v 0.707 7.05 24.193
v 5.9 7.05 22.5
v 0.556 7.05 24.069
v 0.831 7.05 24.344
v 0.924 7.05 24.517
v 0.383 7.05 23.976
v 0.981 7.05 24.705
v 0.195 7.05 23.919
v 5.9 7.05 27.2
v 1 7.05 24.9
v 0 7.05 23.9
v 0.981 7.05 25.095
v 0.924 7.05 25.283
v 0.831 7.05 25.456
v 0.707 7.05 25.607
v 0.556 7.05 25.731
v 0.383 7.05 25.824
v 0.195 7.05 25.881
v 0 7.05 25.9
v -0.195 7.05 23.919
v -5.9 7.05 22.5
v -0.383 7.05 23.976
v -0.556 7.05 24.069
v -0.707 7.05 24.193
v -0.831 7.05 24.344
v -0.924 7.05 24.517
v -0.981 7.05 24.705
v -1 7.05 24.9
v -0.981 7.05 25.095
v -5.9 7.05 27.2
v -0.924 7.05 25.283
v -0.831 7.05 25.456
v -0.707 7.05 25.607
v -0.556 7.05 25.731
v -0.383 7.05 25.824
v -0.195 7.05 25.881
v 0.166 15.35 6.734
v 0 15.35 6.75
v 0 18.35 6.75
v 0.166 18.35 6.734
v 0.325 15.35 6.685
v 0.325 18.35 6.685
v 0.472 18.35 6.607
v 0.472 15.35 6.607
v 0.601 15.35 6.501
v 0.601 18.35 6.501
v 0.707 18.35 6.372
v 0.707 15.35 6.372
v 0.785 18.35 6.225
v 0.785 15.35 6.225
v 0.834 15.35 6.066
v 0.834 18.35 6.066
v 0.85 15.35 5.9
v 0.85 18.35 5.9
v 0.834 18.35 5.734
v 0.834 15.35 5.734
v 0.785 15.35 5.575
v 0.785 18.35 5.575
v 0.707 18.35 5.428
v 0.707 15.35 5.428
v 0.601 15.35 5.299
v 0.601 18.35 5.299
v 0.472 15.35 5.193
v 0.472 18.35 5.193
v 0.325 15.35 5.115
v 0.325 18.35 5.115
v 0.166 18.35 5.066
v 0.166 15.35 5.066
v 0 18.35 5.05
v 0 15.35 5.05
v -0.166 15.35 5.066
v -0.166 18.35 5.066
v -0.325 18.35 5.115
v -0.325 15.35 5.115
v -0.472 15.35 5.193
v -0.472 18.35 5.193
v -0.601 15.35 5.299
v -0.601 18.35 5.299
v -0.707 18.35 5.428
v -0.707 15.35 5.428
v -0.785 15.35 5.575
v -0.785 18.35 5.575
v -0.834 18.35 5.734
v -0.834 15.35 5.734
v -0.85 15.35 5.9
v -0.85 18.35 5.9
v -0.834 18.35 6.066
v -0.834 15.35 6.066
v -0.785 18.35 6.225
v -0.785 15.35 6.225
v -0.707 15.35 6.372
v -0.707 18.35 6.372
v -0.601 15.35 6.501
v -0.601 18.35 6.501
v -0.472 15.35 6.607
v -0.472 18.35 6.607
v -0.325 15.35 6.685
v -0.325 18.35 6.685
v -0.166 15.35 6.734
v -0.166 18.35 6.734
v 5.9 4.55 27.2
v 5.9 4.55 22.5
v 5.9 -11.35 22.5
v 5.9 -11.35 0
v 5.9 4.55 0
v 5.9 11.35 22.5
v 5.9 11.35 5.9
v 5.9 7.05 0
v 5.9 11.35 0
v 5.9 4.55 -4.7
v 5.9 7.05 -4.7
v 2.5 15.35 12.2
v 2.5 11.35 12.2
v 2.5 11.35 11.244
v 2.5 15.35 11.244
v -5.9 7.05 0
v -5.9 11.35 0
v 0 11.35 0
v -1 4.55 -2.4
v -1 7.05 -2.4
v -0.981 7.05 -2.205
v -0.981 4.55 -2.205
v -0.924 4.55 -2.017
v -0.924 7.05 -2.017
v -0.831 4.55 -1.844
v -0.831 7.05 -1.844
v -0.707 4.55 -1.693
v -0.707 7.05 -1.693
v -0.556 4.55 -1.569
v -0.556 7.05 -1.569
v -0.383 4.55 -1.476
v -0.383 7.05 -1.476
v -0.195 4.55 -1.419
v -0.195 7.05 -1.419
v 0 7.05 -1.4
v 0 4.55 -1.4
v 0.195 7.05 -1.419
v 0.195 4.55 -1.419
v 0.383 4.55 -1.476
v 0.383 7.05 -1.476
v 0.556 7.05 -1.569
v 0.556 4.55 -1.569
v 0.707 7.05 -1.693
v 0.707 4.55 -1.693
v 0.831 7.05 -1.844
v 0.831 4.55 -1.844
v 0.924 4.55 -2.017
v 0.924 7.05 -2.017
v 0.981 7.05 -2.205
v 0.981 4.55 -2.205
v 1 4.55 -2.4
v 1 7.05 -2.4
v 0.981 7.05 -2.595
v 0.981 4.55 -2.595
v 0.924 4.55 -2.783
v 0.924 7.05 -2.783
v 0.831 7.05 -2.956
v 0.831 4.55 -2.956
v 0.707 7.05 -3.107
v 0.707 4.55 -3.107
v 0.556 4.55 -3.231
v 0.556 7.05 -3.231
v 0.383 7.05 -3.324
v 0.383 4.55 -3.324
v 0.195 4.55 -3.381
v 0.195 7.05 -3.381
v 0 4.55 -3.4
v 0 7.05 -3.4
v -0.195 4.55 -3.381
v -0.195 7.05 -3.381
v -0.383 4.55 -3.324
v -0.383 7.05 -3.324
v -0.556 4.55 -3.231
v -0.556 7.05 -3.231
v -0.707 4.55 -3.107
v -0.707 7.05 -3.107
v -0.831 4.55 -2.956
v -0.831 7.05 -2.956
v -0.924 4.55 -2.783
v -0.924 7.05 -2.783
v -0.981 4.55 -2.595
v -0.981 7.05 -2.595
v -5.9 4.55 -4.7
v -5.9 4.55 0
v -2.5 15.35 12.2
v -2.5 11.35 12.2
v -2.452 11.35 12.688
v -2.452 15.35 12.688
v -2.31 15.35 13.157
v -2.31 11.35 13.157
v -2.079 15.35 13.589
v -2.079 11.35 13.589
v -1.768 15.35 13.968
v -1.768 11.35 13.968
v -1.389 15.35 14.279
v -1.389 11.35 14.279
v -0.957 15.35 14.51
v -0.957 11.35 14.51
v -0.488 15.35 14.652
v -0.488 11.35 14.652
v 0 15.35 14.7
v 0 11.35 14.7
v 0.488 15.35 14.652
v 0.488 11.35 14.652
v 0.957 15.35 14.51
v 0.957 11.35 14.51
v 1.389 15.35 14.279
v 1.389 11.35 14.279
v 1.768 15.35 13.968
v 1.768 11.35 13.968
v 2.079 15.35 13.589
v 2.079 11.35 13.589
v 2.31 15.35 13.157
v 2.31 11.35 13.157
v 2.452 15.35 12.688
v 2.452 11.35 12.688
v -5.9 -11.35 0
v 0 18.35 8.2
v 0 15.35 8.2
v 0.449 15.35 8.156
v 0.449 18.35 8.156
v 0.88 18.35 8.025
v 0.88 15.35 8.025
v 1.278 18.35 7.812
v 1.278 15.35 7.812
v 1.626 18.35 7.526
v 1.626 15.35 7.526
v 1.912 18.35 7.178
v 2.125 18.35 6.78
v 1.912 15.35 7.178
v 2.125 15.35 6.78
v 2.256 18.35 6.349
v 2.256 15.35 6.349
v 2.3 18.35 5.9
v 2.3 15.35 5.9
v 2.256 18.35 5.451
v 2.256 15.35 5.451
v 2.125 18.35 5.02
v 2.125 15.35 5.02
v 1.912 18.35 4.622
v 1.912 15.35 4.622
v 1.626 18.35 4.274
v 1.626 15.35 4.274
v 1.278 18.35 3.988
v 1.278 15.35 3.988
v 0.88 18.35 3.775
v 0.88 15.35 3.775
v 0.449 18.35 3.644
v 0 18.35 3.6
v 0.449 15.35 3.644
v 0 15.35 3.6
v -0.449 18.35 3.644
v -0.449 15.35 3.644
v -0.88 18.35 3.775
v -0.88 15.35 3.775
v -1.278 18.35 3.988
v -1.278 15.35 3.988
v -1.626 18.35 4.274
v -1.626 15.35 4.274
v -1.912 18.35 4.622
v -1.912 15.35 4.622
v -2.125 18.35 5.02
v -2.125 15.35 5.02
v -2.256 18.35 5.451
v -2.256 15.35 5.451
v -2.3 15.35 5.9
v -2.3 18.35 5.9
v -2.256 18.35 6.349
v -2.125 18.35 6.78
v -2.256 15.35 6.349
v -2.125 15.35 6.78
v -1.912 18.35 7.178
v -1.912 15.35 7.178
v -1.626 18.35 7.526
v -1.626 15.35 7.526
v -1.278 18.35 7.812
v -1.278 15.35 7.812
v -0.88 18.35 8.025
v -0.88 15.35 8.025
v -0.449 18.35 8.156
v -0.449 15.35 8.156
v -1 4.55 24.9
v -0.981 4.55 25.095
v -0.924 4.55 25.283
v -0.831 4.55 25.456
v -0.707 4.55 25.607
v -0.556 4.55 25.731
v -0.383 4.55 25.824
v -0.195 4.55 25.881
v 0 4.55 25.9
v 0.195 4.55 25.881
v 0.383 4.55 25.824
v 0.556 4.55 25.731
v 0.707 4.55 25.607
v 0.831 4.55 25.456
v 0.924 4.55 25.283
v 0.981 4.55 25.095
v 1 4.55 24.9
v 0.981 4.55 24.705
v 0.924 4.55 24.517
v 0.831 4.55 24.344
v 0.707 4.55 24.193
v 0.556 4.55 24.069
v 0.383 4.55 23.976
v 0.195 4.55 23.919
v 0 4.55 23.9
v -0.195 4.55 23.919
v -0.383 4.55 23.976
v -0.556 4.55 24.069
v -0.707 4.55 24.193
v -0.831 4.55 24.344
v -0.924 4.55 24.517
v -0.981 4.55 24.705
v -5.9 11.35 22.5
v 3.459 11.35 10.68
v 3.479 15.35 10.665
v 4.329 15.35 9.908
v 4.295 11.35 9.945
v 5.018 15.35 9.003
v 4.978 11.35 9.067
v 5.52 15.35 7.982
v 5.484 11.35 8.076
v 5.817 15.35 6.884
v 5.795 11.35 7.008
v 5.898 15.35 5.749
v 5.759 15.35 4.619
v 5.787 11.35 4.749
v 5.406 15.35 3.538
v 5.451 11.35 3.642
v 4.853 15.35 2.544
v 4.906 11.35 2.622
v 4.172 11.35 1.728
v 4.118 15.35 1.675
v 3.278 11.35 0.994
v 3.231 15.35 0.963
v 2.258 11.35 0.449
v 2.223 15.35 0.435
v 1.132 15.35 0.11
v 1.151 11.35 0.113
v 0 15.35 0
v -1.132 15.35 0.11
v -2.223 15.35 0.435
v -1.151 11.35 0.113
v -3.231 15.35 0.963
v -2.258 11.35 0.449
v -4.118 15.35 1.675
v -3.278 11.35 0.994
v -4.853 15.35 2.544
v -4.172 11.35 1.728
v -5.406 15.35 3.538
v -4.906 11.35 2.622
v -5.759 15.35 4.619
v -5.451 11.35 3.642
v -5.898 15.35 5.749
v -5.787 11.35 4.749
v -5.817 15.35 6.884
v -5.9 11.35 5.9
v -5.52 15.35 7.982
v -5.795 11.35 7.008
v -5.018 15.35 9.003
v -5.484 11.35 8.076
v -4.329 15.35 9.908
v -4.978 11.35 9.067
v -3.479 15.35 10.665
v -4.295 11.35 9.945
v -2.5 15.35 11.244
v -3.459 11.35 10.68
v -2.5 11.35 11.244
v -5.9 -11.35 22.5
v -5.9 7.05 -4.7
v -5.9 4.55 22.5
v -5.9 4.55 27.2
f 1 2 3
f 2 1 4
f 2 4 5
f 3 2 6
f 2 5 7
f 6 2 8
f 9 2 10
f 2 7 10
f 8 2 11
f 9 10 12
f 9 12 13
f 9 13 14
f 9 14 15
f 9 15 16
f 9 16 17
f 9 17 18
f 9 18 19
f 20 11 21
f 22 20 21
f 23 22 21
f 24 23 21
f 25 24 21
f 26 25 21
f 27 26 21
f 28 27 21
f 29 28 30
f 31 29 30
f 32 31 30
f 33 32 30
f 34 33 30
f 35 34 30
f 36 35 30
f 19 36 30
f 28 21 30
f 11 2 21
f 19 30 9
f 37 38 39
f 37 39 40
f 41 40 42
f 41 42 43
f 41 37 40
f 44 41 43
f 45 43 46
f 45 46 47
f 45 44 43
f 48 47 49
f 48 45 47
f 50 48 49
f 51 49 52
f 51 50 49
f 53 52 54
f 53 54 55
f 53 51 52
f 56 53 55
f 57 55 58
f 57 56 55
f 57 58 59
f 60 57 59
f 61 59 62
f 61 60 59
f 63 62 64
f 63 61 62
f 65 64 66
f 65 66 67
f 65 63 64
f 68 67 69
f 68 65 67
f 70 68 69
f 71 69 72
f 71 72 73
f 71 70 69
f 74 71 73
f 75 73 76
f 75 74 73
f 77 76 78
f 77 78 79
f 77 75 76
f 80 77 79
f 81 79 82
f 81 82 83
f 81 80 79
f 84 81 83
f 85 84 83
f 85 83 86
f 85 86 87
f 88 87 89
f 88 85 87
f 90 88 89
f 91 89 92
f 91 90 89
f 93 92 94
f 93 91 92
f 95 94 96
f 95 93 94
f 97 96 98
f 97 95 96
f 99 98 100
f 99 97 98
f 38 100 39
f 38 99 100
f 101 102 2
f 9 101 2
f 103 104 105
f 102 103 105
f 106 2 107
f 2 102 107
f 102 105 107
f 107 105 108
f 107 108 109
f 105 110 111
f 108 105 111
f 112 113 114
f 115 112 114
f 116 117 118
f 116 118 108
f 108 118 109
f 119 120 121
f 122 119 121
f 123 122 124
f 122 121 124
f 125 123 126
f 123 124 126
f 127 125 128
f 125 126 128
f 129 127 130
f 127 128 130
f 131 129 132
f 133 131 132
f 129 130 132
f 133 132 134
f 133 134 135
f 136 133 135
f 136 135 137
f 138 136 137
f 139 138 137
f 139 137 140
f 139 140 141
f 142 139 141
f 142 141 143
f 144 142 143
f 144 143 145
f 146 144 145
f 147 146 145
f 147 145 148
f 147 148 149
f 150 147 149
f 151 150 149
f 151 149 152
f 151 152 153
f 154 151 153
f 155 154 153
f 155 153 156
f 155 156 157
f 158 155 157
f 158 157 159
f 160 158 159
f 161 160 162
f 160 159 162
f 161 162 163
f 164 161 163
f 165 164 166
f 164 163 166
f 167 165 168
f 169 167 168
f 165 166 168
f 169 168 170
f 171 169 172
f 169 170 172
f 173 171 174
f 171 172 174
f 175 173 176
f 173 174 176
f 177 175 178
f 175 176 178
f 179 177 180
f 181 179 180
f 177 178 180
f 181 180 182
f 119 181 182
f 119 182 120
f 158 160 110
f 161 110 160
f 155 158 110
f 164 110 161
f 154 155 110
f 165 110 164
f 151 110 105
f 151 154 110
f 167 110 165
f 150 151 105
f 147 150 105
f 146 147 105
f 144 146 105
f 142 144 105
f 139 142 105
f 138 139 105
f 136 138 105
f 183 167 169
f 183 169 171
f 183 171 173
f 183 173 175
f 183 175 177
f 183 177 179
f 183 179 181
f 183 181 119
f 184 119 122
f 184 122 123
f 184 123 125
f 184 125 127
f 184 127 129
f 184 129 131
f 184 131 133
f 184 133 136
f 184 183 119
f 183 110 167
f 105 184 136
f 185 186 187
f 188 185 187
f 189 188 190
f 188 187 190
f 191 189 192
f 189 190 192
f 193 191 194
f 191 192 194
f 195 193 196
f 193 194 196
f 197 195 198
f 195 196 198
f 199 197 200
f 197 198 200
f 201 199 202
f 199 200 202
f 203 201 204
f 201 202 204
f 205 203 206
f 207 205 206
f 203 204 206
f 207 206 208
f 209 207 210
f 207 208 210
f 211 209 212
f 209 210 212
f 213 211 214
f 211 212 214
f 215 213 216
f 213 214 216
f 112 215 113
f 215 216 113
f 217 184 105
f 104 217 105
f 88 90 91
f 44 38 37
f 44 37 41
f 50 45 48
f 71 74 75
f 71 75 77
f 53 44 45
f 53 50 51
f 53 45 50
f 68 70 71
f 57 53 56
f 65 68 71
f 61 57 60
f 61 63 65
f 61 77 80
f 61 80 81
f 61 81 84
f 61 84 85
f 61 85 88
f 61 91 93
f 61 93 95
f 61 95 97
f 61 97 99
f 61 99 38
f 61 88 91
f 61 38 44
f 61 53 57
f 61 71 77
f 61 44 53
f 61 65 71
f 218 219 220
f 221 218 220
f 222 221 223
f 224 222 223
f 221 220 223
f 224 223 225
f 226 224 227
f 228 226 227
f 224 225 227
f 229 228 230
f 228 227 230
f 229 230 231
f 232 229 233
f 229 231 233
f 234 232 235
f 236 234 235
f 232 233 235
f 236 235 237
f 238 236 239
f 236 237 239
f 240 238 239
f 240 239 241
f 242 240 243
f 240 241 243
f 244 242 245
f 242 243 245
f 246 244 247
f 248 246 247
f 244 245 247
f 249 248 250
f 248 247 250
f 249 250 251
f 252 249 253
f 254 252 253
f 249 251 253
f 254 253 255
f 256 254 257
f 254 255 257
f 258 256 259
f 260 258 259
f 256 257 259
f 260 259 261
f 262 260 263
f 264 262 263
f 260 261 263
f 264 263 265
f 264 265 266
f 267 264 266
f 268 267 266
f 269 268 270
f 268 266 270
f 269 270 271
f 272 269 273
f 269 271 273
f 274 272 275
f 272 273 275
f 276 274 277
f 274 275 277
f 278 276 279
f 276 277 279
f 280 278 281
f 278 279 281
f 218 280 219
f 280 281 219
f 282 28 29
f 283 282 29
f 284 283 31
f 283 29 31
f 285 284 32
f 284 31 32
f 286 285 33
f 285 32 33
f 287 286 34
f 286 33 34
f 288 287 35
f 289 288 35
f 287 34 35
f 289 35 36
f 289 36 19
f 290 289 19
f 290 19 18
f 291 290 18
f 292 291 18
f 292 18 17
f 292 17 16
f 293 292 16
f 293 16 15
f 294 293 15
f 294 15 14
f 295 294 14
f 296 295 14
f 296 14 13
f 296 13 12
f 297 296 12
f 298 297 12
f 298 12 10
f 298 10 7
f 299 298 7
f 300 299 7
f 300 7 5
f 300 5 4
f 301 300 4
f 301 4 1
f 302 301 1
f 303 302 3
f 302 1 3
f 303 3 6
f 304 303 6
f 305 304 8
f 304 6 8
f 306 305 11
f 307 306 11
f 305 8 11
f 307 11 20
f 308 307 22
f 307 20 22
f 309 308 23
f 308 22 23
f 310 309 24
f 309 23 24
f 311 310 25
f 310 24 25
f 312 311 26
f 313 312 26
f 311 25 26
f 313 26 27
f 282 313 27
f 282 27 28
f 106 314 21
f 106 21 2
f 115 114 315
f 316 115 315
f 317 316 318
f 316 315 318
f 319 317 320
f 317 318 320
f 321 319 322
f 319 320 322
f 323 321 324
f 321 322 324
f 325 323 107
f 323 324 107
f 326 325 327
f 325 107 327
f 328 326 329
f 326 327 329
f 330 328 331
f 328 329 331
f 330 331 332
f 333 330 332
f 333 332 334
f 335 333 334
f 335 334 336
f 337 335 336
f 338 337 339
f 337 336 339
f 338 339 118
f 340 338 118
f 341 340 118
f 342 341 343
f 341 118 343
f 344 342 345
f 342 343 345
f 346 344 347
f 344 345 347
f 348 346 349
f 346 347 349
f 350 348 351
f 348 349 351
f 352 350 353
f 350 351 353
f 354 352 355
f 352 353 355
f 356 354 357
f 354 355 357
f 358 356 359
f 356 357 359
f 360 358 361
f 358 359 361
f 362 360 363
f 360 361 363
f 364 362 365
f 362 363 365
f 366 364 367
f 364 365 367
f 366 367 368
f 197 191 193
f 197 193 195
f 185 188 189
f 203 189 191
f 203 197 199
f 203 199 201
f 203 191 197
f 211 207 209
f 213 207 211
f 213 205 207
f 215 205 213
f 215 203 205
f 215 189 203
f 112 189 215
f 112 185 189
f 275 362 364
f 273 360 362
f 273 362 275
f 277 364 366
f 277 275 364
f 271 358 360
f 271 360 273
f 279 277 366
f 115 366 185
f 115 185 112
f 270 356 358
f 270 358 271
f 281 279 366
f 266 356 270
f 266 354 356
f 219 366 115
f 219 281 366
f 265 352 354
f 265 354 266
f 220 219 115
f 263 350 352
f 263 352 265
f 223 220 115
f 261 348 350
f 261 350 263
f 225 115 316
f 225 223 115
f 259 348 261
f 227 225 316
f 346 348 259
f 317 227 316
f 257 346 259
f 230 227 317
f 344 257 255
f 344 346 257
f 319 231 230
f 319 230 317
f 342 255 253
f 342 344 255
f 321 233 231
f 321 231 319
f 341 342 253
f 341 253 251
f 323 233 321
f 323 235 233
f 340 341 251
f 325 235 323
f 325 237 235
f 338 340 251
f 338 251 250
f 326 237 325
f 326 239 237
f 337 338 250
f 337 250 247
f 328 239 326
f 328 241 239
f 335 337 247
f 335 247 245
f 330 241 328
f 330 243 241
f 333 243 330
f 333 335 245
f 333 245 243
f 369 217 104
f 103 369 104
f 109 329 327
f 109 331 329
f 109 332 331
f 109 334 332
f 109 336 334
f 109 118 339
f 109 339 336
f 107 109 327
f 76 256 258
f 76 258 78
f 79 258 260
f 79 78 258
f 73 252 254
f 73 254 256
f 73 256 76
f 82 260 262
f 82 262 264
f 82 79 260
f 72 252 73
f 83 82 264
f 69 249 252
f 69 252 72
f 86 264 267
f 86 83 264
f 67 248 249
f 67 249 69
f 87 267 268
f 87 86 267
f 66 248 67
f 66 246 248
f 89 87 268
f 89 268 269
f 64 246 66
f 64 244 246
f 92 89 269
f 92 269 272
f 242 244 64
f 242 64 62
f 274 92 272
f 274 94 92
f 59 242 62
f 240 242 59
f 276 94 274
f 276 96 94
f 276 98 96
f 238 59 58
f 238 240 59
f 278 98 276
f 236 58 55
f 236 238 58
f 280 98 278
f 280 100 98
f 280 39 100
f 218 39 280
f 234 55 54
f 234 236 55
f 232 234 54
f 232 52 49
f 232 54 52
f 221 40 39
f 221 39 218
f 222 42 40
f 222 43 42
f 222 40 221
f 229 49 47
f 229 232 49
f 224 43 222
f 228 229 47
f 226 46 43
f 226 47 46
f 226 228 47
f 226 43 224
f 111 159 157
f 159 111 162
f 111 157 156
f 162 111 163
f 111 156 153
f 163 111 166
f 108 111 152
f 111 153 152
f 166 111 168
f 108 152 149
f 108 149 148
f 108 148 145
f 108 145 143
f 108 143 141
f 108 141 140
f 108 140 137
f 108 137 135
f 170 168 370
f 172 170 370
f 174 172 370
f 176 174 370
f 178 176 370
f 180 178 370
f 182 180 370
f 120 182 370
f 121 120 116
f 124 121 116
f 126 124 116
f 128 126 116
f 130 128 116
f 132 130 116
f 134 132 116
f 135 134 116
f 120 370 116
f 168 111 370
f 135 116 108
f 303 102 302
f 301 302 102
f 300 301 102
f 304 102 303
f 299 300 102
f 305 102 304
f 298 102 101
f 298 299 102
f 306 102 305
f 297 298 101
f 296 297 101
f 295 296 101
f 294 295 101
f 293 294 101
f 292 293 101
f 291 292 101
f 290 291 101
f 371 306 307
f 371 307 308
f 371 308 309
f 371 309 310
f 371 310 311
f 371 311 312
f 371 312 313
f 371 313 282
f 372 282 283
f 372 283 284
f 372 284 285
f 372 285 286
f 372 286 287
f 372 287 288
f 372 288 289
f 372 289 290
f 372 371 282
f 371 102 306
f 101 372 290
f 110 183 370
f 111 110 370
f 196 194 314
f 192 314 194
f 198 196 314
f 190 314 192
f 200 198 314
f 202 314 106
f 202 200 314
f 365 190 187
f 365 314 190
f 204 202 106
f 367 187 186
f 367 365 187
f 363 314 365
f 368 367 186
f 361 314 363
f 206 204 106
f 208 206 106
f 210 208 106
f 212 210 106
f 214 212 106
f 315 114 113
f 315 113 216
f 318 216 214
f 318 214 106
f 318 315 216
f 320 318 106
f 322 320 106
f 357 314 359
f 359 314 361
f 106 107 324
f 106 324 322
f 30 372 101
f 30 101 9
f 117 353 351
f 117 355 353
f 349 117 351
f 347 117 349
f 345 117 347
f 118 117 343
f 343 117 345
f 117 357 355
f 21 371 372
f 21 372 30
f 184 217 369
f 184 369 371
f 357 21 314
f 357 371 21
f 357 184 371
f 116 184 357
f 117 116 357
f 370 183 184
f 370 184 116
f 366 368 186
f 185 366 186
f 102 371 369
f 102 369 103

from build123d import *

# Parameters (mm, degrees)
SKETCH1_W           = 11.8
SKETCH1_H           = 22.7
BOSS_EXTRUDE1_DEPTH = 22.5
BOSS_EXTRUDE2_DEPTH = 4
SKETCH3_R           = 2.3
SKETCH3_R_2         = 0.85
BOSS_EXTRUDE3_DEPTH = 3
SKETCH4_W           = 4.7
SKETCH4_H           = 2.5
BOSS_EXTRUDE4_DEPTH = 11.8
CUT_EXTRUDE1_REACH  = 35.365
SKETCH5_R           = 1


with BuildPart() as part:
    # Sketch1 → Boss-Extrude1 (new body)
    with BuildSketch(Plane.XY):
        Rectangle(SKETCH1_W, SKETCH1_H)
    extrude(amount=BOSS_EXTRUDE1_DEPTH)

    # Sketch2 → Boss-Extrude2 (add)
    with BuildSketch(Plane(origin=(0, 11.35, 0), x_dir=(1, 0, 0), z_dir=(0, 1, 0))):
        with BuildLine():
            Line((2.5, -12.2), (2.5, -11.244155686))
            ThreePointArc((2.5, -11.244155686), (0, 0), (-2.5, -11.244155686))
            Line((-2.5, -11.244155686), (-2.5, -12.2))
            ThreePointArc((-2.5, -12.2), (0, -14.7), (2.5, -12.2))
        make_face()
    extrude(amount=BOSS_EXTRUDE2_DEPTH)

    # Sketch3 → Boss-Extrude3 (add)
    with BuildSketch(Plane(origin=(0, 15.35, 0), x_dir=(1, 0, 0), z_dir=(0, 1, 0))):
        with Locations(Location((0, -5.9, 0), (0, 0, 270))):
            Circle(SKETCH3_R)
        with Locations(Location((0, -5.9, 0), (0, 0, 270))):
            Circle(SKETCH3_R_2, mode=Mode.SUBTRACT)
    extrude(amount=BOSS_EXTRUDE3_DEPTH)

    # Sketch4 → Boss-Extrude4 (add)
    with BuildSketch(Plane.ZY.offset(5.9)):
        with Locations((-2.35, 5.8)):
            Rectangle(SKETCH4_W, SKETCH4_H)
        with Locations((24.85, 5.8)):
            Rectangle(SKETCH4_W, SKETCH4_H)
    extrude(amount=-BOSS_EXTRUDE4_DEPTH)

    # Sketch5 → Cut-Extrude1 (cut, up to next)
    with BuildSketch(Plane(origin=(0, 7.05, 0), x_dir=(1, 0, 0), z_dir=(0, 1, 0)), mode=Mode.PRIVATE) as cut_extrude1_sk1:
        with Locations(Location((0, 2.4, 0), (0, 0, 180))):
            Circle(SKETCH5_R)
    cut_extrude1_tool1 = extrude(cut_extrude1_sk1.sketch, amount=-CUT_EXTRUDE1_REACH, mode=Mode.PRIVATE) & part.part
    # Sketch5 → Cut-Extrude1 (cut, up to next)
    with BuildSketch(Plane(origin=(0, 7.05, 0), x_dir=(1, 0, 0), z_dir=(0, 1, 0)), mode=Mode.PRIVATE) as cut_extrude1_sk2:
        with Locations(Location((0, -24.9, 0), (0, 0, 180))):
            Circle(SKETCH5_R)
    cut_extrude1_tool2 = extrude(cut_extrude1_sk2.sketch, amount=-CUT_EXTRUDE1_REACH, mode=Mode.PRIVATE) & part.part
    add(cut_extrude1_tool1.solids().sort_by_distance((0, 7.05, -2.4))[0], mode=Mode.SUBTRACT)
    add(cut_extrude1_tool2.solids().sort_by_distance((0, 7.05, 24.9))[0], mode=Mode.SUBTRACT)


solid = part.part
